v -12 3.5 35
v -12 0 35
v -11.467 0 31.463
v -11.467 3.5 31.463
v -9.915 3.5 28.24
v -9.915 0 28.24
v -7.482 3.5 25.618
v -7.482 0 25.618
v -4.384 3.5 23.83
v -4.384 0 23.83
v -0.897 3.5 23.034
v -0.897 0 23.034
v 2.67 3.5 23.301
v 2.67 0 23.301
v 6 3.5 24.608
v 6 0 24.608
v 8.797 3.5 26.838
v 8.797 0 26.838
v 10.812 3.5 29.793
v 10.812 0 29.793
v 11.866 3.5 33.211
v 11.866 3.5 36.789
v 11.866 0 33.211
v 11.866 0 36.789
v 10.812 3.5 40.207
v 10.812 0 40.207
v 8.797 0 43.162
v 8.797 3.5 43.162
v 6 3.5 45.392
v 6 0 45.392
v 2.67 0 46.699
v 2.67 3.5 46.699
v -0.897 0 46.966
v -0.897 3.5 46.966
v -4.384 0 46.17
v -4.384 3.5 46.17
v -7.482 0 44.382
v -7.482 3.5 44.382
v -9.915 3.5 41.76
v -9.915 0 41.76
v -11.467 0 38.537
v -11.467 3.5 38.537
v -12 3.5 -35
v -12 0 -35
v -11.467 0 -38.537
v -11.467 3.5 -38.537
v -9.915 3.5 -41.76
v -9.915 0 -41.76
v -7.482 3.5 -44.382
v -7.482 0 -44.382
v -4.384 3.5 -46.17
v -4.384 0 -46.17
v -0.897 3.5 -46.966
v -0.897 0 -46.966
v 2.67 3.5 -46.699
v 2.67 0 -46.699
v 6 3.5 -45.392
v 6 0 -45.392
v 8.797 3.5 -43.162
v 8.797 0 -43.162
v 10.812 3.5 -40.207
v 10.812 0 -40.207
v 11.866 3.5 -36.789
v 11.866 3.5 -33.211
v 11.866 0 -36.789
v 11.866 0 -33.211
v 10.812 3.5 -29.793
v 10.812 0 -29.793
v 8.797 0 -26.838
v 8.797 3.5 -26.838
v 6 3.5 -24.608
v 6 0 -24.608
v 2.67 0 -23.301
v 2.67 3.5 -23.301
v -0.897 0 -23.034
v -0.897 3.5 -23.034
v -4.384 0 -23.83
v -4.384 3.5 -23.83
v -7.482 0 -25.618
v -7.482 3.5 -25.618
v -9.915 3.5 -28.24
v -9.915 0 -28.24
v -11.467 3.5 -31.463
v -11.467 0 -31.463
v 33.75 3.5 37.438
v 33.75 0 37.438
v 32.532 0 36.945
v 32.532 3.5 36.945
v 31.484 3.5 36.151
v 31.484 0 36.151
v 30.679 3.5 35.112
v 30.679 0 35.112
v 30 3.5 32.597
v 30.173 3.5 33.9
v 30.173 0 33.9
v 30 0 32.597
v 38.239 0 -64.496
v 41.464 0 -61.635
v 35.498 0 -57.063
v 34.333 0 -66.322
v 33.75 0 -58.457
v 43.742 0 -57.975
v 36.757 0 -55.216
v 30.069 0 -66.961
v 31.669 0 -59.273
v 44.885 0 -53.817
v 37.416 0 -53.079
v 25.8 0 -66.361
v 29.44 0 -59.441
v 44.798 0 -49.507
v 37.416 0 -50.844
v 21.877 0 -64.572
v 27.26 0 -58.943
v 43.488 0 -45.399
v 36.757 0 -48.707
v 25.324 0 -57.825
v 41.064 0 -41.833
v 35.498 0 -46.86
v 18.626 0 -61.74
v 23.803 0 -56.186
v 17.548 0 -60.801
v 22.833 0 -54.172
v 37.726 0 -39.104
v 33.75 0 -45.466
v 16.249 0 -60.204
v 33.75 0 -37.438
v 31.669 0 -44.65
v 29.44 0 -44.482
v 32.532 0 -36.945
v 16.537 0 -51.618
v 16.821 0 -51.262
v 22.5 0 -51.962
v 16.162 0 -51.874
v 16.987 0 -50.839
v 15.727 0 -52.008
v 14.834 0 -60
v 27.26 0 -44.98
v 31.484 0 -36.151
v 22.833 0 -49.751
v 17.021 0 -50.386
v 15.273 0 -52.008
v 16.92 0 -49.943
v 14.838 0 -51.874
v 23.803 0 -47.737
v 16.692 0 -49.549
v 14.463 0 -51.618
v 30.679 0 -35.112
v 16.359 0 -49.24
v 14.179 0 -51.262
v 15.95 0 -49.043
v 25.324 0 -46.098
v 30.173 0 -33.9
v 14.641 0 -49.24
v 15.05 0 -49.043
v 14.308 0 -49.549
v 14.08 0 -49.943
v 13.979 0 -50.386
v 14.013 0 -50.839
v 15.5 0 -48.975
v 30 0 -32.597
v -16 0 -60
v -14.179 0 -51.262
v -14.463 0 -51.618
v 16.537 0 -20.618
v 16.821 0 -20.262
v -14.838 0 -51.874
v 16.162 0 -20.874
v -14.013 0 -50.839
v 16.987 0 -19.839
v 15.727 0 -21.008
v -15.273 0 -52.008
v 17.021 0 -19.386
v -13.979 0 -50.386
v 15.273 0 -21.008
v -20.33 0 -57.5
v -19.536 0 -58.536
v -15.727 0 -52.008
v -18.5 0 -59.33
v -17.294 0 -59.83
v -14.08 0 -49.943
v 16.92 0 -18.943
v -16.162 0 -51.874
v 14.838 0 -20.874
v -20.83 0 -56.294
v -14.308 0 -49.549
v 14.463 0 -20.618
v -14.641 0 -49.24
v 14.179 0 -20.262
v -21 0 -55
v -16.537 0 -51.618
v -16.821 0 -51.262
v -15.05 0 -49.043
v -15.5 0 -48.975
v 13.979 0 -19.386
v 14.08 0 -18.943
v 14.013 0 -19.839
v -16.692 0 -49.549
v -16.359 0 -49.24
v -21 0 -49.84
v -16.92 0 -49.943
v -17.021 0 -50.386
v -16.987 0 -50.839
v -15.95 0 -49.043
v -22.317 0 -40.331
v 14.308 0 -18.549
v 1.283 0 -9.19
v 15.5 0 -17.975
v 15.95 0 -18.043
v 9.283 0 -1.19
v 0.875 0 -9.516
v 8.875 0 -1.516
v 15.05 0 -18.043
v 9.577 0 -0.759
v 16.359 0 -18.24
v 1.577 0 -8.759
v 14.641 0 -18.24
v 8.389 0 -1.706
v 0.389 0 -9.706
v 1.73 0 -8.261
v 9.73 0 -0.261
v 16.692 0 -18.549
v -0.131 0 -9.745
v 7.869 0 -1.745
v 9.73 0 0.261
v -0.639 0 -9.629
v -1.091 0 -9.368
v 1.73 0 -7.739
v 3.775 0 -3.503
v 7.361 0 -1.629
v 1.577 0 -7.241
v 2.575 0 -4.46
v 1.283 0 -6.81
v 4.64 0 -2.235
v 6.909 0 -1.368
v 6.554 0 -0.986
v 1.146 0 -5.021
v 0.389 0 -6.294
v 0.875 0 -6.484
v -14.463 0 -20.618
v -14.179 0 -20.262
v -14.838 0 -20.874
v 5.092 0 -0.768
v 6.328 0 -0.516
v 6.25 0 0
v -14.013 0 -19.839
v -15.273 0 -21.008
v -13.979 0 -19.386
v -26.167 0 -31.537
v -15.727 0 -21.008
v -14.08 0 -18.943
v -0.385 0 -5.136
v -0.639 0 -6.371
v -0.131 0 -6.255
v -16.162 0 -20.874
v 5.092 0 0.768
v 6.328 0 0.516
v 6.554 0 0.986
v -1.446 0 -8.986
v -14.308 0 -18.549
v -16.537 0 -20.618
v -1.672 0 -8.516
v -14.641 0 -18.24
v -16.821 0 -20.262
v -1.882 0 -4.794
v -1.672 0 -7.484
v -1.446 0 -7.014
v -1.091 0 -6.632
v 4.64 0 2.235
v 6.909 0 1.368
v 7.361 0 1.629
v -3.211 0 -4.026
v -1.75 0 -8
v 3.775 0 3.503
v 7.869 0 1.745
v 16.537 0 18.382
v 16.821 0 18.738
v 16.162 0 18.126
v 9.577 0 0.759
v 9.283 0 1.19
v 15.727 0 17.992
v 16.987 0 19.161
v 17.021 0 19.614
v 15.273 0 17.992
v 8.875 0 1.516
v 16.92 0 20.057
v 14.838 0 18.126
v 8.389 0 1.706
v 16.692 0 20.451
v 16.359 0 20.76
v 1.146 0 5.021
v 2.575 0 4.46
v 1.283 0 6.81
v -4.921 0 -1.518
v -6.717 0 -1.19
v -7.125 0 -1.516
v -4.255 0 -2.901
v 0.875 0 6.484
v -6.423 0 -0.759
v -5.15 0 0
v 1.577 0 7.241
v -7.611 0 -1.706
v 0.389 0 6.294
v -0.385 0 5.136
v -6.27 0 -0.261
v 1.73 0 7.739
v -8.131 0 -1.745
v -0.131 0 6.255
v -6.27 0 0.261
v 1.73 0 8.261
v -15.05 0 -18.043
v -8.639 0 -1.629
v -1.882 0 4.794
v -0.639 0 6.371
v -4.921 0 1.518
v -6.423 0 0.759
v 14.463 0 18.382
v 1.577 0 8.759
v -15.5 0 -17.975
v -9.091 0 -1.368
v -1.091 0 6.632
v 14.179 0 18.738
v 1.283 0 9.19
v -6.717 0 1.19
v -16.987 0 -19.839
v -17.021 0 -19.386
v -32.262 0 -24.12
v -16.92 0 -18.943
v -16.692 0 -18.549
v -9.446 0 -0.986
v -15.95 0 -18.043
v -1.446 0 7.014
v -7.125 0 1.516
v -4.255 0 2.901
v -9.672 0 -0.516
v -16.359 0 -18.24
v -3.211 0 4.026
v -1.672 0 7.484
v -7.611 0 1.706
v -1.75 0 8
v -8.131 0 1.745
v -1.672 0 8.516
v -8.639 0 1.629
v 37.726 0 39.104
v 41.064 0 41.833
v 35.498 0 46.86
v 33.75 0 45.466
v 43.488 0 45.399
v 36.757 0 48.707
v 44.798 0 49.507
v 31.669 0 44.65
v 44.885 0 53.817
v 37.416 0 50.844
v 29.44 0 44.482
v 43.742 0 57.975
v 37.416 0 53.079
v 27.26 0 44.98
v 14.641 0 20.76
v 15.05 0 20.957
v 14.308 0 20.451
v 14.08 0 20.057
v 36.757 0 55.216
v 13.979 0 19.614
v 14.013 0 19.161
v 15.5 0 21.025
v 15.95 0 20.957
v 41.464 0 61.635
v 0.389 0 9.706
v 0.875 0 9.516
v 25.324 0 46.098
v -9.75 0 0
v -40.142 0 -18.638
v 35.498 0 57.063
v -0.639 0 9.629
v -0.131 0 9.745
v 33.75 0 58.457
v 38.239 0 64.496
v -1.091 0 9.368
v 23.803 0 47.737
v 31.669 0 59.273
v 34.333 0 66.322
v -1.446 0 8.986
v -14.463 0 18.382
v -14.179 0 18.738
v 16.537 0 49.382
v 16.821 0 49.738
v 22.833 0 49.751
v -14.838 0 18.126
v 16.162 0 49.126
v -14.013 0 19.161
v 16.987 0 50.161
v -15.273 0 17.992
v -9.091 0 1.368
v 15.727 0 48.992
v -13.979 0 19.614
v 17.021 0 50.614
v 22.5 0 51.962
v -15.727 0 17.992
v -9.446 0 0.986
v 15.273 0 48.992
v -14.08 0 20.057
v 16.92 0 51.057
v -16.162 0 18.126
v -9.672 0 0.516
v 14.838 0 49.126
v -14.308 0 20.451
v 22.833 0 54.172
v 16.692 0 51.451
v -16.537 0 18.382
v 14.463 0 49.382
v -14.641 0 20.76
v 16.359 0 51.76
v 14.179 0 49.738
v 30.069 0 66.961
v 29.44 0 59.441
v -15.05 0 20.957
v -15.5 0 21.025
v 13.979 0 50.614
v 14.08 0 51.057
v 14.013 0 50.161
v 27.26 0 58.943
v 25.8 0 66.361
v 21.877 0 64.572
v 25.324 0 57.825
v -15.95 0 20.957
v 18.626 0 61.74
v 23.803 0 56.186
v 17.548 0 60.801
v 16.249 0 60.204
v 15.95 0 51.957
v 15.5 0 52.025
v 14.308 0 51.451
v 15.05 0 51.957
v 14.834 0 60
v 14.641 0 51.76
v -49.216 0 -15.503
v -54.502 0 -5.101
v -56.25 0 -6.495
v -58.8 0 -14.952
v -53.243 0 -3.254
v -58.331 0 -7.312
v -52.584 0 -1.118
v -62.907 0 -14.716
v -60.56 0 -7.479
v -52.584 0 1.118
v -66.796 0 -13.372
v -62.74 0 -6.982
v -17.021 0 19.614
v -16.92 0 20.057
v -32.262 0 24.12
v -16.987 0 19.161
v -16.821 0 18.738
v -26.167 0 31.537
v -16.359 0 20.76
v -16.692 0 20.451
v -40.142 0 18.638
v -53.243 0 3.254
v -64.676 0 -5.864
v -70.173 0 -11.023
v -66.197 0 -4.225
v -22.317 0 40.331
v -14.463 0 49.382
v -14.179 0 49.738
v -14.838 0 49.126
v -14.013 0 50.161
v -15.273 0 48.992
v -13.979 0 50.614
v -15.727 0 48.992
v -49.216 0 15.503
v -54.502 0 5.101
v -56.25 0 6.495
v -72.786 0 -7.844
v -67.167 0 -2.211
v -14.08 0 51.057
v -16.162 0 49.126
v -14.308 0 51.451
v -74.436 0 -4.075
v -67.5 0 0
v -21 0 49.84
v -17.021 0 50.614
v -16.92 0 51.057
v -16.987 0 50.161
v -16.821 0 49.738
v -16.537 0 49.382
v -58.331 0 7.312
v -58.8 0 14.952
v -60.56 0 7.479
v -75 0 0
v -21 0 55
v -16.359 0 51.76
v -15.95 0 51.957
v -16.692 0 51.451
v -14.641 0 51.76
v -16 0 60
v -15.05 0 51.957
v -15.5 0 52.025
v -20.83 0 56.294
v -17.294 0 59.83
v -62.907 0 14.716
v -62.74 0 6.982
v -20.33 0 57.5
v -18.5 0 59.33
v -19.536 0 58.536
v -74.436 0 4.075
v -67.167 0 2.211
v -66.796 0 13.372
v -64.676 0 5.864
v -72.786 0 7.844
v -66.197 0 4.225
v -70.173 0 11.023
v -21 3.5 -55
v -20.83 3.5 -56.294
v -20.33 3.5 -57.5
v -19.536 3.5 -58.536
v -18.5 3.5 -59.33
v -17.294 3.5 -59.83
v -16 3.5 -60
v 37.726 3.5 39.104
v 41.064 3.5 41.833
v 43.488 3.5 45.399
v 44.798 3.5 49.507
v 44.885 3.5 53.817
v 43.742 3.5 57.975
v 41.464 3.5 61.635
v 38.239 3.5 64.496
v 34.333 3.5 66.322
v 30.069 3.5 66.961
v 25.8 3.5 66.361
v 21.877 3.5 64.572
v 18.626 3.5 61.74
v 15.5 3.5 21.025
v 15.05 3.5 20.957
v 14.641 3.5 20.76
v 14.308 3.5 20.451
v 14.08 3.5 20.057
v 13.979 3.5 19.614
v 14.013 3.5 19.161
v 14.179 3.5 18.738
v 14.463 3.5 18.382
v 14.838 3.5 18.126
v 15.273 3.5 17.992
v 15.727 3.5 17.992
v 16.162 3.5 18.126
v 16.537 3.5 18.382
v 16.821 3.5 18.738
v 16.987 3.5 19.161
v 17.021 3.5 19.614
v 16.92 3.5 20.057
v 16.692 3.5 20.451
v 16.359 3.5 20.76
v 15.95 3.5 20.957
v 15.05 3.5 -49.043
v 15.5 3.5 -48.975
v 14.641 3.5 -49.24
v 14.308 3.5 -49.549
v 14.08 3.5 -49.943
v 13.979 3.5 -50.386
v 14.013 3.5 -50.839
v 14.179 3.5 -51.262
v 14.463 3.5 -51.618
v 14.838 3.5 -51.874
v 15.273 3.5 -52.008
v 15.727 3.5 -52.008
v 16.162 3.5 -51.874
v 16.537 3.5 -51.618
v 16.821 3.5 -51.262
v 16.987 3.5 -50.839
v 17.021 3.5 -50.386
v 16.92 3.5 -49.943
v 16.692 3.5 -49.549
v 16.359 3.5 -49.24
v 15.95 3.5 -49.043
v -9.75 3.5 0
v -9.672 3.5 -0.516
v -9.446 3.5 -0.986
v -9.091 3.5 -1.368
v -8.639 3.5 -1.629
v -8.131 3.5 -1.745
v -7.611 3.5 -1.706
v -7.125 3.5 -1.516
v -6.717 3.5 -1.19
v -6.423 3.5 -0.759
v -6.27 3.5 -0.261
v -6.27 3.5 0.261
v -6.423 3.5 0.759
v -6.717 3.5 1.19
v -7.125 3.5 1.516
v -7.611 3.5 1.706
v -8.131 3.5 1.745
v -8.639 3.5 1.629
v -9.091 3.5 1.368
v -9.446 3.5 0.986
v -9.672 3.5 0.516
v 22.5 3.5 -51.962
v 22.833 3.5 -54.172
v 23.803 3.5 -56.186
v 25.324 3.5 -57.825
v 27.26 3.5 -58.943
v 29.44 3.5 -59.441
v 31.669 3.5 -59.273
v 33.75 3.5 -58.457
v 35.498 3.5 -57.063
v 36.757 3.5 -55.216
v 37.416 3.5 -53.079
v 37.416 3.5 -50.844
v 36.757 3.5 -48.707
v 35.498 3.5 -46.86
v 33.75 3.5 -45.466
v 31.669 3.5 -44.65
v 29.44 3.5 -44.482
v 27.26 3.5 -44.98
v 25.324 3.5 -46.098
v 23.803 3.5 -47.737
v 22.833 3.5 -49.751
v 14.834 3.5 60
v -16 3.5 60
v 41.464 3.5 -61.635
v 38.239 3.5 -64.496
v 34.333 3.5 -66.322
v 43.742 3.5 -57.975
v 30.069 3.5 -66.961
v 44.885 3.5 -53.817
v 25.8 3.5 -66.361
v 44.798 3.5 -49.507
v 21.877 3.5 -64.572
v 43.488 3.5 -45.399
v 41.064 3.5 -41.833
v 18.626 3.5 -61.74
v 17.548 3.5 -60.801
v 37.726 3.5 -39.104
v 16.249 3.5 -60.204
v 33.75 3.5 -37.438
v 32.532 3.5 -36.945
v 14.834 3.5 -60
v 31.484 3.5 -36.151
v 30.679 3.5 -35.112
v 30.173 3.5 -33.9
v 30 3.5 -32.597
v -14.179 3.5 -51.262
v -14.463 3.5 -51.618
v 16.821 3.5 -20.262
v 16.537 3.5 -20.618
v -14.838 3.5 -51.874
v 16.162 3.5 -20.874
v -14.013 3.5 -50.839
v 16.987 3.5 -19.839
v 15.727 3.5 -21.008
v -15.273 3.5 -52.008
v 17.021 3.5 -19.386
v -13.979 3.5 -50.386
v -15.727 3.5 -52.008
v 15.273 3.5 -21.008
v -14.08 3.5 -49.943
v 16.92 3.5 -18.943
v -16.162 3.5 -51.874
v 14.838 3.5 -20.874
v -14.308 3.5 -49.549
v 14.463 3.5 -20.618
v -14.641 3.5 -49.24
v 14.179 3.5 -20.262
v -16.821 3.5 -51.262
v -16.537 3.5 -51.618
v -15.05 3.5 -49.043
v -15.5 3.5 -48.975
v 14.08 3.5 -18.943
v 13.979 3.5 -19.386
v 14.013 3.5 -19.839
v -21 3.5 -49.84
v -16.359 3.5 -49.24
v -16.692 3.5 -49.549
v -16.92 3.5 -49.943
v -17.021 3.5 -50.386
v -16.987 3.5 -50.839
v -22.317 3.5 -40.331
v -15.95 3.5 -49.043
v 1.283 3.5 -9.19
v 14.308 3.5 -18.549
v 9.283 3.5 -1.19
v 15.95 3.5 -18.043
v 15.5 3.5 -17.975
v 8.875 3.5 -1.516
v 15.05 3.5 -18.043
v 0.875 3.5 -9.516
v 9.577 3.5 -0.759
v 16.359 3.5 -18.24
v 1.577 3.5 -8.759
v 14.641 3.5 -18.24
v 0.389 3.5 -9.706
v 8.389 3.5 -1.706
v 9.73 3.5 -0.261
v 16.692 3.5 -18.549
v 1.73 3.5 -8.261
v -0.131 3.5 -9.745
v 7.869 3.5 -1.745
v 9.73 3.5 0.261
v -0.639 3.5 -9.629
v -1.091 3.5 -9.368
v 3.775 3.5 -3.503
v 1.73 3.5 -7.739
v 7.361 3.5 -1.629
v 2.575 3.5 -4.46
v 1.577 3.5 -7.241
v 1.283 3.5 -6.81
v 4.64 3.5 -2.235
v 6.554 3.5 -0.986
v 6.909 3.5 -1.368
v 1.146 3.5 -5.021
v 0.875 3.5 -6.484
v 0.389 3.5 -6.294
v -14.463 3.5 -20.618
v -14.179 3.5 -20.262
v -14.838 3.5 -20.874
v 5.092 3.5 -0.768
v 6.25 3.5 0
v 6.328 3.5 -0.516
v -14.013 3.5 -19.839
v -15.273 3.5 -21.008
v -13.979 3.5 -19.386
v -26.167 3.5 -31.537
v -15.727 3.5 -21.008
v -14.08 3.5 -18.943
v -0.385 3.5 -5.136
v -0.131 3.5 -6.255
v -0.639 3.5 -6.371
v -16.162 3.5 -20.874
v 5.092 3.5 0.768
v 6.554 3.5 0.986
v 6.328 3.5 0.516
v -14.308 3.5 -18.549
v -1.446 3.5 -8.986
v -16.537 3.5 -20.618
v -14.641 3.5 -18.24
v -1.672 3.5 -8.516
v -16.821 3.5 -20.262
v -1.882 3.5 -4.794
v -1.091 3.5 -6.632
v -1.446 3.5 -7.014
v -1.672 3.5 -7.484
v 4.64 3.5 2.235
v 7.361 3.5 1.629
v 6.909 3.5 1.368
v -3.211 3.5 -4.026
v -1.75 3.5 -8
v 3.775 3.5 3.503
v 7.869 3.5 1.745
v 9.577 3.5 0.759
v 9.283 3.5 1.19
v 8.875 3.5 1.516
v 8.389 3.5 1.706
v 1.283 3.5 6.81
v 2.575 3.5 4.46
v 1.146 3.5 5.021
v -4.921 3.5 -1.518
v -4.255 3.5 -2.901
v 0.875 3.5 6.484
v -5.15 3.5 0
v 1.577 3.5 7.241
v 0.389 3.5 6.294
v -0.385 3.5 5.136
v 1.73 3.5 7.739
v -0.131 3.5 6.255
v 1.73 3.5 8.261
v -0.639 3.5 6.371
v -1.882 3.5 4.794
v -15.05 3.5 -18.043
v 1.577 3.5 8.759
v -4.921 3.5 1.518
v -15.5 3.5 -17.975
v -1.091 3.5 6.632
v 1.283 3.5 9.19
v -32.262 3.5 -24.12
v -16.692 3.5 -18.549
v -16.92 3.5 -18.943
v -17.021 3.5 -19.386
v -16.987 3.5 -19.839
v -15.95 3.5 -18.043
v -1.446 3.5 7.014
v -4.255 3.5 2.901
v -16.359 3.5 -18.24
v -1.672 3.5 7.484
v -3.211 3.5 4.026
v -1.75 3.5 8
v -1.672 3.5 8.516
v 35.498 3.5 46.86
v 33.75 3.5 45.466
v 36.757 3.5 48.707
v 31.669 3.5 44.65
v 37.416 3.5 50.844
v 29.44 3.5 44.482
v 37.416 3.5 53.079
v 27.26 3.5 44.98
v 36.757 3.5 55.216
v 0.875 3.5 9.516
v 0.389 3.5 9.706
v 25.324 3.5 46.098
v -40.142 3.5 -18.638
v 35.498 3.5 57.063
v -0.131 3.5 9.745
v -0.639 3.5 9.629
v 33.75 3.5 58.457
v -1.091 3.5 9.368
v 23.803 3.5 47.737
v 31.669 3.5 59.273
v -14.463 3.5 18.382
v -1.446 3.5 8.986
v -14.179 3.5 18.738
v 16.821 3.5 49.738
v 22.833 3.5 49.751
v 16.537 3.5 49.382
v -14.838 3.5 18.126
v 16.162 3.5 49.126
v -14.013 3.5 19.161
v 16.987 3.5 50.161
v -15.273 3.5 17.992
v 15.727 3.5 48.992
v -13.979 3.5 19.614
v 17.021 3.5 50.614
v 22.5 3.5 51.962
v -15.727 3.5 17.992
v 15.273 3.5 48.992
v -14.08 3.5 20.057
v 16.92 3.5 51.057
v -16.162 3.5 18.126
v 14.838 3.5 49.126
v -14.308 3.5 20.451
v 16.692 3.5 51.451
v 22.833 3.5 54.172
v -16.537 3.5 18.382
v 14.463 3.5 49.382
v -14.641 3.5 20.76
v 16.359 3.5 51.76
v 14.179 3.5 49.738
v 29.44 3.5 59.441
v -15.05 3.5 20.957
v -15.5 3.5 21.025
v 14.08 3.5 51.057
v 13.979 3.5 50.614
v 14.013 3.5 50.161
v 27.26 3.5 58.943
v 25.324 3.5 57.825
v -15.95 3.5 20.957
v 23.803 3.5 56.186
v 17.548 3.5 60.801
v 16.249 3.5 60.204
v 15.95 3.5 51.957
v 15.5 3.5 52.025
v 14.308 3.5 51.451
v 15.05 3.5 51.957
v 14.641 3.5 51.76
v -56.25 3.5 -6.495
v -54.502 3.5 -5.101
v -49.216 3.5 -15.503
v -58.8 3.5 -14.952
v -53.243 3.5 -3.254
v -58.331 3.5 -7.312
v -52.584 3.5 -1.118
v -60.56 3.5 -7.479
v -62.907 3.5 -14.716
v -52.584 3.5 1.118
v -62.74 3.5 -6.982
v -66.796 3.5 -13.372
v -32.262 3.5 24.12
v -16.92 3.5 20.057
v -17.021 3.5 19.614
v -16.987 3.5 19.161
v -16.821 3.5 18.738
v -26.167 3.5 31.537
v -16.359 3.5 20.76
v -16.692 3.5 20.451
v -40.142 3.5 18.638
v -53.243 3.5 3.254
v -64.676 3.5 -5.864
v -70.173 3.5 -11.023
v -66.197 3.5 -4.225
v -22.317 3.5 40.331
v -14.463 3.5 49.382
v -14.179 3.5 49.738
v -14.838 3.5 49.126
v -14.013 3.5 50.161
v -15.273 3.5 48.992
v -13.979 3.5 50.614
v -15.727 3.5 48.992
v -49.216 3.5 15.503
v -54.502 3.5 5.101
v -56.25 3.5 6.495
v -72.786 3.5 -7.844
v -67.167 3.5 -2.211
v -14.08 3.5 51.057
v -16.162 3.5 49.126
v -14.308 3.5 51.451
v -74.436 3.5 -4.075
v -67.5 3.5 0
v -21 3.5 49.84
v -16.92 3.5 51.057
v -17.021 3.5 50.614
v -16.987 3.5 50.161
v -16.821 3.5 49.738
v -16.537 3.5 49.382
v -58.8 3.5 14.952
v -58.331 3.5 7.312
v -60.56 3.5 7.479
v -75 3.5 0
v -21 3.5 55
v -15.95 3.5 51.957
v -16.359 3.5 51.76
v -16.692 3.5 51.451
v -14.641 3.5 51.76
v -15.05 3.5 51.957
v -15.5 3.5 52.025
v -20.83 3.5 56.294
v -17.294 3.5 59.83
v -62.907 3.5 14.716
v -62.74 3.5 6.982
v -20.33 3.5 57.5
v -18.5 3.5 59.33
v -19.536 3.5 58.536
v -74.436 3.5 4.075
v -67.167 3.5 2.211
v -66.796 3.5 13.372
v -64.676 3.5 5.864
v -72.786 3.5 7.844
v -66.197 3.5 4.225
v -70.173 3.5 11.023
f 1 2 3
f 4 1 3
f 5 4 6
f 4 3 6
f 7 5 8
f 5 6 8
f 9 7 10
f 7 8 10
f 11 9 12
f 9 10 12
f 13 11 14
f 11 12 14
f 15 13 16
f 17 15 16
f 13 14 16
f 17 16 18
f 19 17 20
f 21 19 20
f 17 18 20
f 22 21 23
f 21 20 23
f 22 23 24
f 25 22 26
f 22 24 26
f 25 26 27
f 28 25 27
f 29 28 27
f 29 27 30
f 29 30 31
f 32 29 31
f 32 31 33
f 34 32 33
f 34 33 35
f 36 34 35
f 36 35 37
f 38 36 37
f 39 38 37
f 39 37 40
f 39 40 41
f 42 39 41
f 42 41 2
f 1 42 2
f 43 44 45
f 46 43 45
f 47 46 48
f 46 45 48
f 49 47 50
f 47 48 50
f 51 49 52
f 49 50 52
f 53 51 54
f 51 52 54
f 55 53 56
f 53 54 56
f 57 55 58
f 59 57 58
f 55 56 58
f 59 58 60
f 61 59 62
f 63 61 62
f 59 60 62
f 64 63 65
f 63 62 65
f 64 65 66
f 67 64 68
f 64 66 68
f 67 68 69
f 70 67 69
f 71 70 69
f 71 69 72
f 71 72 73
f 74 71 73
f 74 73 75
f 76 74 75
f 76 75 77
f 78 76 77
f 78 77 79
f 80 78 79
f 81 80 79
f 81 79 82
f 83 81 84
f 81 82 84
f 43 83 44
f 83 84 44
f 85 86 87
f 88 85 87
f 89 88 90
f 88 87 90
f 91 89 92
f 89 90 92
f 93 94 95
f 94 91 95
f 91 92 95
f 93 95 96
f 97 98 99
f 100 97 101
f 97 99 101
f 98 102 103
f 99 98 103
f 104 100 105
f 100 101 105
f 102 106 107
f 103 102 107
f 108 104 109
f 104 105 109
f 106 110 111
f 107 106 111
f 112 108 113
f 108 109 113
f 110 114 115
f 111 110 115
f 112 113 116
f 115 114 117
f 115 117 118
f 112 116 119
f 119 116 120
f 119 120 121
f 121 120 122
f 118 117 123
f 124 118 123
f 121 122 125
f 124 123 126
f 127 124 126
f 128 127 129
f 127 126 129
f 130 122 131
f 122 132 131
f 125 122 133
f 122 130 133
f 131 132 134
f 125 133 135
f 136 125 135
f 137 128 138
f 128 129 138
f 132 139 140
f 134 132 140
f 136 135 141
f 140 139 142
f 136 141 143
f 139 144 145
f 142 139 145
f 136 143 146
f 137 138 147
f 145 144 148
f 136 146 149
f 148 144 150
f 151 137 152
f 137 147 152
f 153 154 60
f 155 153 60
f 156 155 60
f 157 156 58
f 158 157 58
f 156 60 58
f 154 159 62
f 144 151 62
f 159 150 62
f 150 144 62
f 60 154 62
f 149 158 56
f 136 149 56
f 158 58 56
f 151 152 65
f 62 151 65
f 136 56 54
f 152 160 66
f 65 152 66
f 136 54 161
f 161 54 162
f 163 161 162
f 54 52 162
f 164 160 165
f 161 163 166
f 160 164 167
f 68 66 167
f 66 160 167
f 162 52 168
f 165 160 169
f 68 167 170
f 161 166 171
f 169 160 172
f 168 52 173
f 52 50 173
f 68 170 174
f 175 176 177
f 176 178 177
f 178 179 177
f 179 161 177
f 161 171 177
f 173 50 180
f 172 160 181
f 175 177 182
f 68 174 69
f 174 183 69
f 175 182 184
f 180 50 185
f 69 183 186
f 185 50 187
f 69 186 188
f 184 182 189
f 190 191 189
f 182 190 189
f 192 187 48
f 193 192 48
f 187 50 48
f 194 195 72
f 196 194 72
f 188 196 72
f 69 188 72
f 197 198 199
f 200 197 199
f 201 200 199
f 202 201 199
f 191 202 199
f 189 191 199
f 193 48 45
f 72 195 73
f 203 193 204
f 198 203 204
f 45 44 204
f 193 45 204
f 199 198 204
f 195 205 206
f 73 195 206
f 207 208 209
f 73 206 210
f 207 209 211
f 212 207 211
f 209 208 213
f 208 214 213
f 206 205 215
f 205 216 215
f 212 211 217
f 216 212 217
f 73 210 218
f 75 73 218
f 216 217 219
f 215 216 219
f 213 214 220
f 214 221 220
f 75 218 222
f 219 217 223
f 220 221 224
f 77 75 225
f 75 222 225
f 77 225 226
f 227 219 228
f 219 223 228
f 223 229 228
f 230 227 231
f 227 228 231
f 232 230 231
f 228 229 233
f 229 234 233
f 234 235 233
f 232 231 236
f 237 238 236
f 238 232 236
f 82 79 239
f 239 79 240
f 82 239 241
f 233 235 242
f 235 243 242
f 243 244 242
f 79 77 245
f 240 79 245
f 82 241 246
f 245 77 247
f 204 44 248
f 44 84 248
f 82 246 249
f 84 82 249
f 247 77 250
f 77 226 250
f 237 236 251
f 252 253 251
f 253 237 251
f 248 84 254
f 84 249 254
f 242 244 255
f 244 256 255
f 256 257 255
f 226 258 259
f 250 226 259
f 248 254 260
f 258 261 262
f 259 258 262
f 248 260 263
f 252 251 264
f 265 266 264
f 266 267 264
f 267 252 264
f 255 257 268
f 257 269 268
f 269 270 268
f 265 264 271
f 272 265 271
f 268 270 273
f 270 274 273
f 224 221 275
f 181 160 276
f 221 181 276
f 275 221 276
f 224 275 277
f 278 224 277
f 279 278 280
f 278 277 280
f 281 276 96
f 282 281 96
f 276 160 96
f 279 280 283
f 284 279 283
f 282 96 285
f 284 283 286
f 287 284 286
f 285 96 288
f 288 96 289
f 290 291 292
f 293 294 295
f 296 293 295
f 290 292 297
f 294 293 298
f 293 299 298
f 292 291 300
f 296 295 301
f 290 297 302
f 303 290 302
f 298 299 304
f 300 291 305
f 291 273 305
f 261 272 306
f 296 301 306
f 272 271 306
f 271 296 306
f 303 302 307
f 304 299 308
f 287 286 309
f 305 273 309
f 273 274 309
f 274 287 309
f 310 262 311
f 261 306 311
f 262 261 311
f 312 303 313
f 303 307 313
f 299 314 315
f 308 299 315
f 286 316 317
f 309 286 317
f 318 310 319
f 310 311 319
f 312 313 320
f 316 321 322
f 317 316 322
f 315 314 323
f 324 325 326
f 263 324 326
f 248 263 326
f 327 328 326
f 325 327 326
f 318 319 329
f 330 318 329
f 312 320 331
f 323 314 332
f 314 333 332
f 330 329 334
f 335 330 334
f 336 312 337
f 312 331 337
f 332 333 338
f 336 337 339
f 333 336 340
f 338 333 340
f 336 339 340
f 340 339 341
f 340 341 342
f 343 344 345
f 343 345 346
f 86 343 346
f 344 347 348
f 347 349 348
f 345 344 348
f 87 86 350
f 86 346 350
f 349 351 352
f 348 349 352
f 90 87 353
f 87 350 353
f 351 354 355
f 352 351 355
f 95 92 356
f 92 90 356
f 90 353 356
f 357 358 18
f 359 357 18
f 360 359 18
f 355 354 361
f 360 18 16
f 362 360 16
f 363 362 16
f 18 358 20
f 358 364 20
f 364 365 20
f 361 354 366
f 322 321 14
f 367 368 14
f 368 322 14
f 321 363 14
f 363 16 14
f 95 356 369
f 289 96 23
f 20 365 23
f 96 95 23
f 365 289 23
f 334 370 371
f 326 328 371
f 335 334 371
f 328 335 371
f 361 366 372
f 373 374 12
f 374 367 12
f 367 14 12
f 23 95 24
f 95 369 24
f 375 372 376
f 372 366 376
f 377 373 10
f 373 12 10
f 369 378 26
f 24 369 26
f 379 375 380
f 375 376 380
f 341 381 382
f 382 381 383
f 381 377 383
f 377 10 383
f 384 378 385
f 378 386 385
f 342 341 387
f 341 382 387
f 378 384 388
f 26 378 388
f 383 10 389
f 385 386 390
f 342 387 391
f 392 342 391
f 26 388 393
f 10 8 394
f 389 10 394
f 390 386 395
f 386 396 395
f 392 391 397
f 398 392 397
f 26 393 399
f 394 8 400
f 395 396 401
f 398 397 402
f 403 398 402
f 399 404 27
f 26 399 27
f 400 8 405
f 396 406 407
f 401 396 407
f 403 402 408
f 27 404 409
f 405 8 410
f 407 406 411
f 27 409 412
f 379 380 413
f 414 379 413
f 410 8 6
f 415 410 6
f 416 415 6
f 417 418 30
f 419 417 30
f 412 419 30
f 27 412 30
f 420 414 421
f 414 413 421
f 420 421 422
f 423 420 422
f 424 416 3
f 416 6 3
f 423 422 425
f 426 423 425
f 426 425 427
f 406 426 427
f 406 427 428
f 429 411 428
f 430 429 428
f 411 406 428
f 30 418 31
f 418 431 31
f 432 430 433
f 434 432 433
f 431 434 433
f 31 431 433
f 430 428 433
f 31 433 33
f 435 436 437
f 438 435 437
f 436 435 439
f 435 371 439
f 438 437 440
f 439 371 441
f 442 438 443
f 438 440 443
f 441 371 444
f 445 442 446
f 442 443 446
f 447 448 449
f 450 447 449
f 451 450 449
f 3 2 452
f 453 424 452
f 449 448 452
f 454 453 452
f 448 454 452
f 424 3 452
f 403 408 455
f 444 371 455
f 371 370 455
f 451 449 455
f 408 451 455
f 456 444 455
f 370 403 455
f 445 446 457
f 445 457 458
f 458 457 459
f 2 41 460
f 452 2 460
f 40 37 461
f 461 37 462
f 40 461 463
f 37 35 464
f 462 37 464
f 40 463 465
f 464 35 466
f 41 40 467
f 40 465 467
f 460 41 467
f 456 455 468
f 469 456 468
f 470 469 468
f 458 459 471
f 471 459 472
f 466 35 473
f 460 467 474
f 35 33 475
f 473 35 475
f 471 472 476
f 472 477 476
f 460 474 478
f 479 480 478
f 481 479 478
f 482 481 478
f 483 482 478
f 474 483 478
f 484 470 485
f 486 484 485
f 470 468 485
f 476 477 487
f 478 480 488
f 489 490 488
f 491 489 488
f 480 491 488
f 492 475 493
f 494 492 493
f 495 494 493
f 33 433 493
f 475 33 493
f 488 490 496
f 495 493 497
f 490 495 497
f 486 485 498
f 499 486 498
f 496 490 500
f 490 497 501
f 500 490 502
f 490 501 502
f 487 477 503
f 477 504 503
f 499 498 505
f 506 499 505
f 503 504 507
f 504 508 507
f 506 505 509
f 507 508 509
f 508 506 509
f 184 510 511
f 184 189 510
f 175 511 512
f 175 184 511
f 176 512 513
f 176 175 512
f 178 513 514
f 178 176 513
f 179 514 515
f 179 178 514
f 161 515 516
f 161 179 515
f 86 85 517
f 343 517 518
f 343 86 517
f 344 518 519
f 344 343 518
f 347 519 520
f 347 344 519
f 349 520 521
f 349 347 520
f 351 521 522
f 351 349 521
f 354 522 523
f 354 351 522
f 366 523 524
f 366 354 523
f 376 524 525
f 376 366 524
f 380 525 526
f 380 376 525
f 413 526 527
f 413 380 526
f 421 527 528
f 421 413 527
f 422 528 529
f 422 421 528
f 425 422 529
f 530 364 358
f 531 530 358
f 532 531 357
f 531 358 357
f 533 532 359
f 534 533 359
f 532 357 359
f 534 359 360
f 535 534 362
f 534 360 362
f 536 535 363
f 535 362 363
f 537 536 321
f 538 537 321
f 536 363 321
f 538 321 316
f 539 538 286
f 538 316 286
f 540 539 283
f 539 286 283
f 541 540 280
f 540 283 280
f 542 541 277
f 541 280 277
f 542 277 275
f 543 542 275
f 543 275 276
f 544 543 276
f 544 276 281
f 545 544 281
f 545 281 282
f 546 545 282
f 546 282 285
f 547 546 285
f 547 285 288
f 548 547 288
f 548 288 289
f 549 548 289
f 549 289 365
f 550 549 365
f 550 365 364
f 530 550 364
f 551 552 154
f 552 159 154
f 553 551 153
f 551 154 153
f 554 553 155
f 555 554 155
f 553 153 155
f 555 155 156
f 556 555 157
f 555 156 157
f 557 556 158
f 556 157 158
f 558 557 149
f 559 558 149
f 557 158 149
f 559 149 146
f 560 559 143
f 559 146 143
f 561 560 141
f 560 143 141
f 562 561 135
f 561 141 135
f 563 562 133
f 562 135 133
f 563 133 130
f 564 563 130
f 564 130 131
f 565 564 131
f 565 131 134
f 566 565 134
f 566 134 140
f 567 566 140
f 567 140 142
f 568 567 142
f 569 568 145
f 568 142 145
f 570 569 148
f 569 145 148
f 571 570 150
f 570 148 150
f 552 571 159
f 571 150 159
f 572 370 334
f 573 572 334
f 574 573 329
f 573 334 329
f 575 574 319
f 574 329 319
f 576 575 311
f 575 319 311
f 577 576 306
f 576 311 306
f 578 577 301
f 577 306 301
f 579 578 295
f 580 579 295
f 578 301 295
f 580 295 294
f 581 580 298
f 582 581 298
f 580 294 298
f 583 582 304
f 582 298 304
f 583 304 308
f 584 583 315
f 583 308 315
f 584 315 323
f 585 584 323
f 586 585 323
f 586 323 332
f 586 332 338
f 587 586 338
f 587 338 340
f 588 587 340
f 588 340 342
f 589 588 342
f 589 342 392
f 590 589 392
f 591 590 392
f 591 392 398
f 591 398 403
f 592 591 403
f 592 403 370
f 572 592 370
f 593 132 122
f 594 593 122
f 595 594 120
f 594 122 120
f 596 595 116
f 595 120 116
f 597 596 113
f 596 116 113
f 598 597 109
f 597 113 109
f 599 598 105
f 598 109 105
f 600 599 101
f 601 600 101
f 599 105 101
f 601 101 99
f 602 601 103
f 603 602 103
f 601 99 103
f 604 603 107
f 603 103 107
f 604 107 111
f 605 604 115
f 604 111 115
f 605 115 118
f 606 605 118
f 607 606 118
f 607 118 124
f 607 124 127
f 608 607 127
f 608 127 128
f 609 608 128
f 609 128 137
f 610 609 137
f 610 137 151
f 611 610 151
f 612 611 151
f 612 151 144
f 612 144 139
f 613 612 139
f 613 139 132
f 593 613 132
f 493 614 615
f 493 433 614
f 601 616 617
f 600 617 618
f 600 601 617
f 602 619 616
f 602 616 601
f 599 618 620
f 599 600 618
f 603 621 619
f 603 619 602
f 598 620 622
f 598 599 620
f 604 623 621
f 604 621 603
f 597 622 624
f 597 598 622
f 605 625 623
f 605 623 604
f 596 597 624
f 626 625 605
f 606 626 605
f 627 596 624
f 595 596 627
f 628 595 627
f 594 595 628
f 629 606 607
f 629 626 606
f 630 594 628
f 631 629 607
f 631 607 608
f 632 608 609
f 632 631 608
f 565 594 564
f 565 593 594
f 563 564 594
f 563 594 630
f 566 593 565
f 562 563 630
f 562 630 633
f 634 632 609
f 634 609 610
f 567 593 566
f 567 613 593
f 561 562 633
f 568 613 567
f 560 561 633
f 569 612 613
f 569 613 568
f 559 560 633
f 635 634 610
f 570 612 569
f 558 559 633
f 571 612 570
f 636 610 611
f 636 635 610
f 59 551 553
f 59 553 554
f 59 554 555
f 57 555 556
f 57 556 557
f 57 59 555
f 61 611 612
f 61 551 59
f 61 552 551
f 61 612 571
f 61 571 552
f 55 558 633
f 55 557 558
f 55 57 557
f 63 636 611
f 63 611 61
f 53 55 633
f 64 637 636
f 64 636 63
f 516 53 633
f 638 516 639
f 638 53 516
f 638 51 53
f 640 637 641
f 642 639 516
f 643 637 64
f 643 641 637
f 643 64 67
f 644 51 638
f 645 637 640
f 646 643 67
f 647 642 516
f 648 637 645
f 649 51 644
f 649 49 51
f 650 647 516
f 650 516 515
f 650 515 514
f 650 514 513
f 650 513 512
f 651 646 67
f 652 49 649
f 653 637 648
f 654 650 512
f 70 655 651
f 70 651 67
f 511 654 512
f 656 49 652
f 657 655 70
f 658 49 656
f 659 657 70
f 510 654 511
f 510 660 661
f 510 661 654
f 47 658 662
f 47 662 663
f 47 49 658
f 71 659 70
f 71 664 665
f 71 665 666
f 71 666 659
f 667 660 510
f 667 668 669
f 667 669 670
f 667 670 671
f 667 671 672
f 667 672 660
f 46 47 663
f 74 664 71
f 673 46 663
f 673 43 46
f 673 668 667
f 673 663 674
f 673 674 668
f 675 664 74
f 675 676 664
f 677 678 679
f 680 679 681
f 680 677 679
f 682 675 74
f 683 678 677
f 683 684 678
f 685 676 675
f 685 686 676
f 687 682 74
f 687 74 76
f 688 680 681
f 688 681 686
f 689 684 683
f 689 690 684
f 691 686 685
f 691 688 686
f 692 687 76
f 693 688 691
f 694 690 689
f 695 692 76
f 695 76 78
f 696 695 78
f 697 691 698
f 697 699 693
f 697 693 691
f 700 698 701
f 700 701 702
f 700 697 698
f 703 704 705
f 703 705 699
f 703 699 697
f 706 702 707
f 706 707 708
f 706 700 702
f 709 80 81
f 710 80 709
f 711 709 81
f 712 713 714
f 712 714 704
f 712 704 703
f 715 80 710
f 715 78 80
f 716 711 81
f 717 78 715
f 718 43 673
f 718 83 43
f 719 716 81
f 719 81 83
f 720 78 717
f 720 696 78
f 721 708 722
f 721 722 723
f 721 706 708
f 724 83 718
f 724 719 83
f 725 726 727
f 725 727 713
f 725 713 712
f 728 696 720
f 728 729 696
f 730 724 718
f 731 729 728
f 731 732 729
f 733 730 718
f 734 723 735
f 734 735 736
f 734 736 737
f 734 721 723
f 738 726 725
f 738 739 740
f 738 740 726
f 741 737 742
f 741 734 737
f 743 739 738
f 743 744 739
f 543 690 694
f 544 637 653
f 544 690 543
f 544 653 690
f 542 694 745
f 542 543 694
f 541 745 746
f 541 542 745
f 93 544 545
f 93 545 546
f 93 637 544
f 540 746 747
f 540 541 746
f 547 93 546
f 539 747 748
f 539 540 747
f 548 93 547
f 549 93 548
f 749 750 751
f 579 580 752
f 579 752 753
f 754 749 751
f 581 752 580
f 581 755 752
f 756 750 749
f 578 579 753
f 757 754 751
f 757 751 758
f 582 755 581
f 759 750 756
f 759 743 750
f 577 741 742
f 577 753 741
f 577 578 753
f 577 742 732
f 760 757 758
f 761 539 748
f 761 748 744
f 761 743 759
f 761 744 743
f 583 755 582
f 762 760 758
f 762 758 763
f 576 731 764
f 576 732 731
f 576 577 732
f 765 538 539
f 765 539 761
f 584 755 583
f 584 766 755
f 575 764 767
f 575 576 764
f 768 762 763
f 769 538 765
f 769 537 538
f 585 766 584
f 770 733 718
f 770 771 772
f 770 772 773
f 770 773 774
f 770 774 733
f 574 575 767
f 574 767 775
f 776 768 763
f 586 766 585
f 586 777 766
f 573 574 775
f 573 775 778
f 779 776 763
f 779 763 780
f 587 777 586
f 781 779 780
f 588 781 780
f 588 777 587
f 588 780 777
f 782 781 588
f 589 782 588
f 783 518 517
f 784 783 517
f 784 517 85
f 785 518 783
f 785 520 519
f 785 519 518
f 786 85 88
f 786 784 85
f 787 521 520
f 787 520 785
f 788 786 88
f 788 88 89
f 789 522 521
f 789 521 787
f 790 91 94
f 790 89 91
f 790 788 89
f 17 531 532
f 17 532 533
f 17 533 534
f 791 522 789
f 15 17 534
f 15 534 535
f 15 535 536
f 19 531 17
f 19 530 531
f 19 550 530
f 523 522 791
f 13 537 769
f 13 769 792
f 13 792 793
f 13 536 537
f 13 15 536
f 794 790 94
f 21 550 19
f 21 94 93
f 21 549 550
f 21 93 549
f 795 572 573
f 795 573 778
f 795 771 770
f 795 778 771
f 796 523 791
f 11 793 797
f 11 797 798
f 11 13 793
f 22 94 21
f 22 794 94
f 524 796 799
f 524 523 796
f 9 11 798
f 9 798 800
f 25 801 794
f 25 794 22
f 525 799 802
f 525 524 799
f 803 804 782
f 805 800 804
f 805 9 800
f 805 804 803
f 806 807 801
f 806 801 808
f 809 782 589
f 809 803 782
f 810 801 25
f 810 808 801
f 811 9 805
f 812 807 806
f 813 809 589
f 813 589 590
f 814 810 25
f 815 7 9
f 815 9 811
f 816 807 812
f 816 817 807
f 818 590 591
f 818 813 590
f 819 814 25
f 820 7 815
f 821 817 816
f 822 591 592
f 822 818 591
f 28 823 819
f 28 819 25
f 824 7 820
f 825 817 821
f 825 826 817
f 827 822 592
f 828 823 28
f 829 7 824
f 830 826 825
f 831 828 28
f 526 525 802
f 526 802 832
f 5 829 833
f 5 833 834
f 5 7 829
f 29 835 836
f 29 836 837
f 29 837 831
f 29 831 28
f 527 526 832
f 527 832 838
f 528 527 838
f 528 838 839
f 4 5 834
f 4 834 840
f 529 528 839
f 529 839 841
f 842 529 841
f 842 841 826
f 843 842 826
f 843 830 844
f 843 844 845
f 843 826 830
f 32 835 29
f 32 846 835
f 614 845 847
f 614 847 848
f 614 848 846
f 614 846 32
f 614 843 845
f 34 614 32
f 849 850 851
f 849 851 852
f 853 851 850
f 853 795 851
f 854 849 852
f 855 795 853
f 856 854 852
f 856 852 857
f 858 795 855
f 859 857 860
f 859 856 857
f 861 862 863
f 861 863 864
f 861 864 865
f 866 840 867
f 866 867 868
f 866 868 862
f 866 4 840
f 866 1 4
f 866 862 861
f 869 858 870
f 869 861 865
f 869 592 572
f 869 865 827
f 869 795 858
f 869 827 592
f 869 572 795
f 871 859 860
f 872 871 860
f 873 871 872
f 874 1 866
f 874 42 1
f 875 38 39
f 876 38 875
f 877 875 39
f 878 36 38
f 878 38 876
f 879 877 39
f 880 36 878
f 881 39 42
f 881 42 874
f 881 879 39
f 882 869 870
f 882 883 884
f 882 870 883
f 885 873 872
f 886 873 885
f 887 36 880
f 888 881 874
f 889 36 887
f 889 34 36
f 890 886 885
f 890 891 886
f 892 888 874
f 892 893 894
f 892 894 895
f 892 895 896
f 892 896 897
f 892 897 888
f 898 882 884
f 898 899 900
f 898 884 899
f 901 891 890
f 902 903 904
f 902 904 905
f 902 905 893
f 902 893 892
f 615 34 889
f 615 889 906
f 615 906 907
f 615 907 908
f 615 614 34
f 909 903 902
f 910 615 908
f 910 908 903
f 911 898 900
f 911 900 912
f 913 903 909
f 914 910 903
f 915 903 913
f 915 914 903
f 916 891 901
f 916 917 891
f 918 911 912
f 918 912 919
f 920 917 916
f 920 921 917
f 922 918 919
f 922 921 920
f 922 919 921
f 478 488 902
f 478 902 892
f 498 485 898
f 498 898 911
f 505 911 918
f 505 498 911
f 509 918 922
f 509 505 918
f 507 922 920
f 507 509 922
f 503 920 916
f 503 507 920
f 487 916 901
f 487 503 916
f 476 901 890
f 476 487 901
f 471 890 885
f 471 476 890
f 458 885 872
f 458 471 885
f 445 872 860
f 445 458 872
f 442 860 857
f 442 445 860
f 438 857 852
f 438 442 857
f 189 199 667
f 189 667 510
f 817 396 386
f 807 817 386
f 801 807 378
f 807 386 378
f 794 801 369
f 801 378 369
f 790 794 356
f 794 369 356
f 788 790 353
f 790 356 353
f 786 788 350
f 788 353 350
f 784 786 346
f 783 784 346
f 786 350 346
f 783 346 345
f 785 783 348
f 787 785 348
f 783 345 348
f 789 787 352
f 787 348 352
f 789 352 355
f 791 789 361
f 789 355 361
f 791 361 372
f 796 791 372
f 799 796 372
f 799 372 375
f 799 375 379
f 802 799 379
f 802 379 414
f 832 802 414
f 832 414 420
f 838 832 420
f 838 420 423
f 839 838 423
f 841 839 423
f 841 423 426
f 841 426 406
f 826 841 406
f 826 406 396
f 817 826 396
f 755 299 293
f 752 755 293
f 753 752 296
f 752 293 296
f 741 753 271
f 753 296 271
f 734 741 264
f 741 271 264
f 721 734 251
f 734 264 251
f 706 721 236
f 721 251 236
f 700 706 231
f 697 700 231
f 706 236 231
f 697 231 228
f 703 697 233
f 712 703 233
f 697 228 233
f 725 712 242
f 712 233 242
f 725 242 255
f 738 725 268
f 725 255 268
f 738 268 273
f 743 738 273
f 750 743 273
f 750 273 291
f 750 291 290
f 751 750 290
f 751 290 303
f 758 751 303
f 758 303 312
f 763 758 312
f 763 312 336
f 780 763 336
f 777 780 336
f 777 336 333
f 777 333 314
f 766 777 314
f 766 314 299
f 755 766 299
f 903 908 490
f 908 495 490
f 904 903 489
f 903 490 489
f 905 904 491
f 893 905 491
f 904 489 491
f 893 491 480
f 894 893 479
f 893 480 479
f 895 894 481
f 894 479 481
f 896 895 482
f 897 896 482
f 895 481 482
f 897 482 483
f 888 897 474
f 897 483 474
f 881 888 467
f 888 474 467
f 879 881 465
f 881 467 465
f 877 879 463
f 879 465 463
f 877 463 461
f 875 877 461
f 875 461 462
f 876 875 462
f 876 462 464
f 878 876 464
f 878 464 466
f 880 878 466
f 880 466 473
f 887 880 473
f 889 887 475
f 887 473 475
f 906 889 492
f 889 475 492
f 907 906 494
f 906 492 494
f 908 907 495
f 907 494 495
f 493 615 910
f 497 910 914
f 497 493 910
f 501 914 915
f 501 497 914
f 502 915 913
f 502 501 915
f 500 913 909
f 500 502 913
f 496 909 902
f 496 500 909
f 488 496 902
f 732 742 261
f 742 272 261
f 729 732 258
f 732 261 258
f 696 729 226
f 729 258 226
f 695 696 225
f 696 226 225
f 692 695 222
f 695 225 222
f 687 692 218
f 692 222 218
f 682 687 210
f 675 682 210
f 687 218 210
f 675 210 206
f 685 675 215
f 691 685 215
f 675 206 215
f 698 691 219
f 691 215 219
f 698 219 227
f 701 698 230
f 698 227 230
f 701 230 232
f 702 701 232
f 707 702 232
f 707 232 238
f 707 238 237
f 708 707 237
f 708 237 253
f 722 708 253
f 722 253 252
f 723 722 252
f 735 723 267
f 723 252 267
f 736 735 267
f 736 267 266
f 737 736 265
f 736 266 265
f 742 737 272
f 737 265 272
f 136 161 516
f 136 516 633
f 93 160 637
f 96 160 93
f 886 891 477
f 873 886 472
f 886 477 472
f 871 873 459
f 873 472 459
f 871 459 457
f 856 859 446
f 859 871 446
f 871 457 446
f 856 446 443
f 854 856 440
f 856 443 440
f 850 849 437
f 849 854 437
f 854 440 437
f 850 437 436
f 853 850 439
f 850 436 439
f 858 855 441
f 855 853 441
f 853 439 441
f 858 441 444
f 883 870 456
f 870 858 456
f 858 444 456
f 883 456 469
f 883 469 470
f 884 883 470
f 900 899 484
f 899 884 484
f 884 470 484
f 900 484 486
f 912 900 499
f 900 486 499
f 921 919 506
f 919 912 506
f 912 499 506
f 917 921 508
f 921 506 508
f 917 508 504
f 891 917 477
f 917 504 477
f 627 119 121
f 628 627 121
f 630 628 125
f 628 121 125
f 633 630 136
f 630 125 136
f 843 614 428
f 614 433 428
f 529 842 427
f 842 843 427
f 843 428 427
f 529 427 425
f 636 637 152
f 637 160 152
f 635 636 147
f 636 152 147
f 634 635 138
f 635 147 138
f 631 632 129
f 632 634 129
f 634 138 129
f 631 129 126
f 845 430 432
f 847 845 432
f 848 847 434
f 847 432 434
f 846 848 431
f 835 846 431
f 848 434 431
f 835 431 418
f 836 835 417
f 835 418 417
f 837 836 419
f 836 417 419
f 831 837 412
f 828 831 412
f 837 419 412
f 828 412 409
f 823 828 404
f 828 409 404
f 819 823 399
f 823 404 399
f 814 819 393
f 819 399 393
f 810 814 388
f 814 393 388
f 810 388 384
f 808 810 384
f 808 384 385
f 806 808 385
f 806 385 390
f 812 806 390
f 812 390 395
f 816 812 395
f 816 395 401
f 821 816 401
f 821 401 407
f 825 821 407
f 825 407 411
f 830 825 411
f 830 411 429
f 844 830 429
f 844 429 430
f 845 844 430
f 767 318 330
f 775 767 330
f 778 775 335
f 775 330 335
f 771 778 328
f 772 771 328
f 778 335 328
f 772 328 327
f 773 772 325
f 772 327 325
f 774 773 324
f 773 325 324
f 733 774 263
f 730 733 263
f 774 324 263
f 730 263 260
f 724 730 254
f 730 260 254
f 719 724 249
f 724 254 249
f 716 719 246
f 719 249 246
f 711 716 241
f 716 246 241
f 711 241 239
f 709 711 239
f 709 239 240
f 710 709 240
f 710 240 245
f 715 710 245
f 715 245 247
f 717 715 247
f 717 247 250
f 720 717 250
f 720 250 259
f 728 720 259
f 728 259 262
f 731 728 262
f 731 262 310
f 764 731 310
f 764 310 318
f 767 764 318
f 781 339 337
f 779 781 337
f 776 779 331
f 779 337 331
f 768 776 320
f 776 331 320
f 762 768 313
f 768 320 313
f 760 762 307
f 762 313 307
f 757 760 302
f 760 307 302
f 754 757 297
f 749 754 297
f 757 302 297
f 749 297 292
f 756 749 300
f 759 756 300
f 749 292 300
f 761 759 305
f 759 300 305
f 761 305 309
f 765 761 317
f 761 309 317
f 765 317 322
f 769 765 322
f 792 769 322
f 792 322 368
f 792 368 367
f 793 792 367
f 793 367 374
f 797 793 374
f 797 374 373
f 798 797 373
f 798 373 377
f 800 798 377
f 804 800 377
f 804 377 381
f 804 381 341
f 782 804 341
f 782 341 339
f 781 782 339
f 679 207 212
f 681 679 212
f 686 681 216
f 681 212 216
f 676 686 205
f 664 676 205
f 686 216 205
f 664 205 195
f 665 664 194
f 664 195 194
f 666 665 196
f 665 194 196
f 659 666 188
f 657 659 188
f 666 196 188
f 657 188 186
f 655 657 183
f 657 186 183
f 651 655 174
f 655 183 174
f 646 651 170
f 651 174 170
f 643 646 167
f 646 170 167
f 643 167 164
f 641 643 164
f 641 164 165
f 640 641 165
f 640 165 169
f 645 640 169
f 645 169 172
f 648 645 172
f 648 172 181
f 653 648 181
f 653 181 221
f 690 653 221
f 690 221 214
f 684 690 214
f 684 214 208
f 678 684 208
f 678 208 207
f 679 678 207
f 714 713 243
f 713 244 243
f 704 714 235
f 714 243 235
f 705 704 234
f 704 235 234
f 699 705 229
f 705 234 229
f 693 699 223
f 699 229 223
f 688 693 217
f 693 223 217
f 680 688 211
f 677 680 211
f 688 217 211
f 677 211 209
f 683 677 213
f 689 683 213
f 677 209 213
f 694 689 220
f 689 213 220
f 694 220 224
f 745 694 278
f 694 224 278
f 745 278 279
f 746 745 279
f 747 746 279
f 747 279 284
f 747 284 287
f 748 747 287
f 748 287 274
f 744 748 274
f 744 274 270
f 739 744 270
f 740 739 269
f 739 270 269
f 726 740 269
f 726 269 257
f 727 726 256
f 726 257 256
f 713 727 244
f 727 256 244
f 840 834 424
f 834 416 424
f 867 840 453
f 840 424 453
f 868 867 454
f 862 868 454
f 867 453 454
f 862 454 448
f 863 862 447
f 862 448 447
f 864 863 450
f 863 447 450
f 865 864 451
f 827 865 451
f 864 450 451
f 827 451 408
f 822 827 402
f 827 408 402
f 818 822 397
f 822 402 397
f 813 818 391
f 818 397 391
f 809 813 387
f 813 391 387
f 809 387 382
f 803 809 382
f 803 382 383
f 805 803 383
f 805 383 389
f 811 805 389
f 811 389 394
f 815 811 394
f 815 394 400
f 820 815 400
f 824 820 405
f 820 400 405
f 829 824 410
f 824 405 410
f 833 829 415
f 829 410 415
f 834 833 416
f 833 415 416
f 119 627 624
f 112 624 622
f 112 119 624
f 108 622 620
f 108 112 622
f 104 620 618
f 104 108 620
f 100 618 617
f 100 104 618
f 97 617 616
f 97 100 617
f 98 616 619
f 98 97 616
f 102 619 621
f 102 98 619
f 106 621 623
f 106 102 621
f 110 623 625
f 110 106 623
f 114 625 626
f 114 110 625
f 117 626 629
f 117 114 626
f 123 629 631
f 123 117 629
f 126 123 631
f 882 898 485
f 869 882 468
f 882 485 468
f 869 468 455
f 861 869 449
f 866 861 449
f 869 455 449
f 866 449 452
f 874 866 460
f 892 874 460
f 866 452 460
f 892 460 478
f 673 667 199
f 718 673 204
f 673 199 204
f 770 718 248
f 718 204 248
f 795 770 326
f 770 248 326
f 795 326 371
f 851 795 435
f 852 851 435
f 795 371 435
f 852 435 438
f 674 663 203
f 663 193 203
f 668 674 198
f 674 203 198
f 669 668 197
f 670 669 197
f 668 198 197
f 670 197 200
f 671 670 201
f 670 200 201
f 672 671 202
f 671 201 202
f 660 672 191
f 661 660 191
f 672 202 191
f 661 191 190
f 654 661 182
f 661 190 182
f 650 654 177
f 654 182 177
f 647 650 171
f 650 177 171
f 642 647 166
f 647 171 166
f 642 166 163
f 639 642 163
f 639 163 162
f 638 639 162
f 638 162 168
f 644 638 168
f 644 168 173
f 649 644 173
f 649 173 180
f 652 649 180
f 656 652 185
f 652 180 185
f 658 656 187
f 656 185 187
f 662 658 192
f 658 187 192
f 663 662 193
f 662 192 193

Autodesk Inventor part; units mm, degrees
ref_plane "YZ Plane" through (0, 0, 0) normal (1, 0, 0) x (0, 1, 0)
ref_plane "XZ Plane" through (0, 0, 0) normal (0, 1, 0) x (-1, 0, 0)
ref_plane "XY Plane" through (0, 0, 0) normal (0, 0, 1) x (1, 0, 0)
sketch "Sketch1" plane through (0, 0, 0) normal (0, 1, 0) x (-1, 0, 0)
  circle A0 centre (0, 0) radius 60
  circle A1 centre (60, 0) radius 7.5
  circle A2 centre (-30, 51.9615) radius 7.5
  circle A3 centre (-30, -51.9615) radius 7.5
  circle A4 centre (0, -35) radius 12
  line L0 (0, -118.7756) -> (0, 118.7756) projected
  line L1 (121.2, 0) -> (-90.2, 0) projected
  circle A5 centre (0, 35) radius 12
  line L2 (21, 10) -> (-21, 10)
  line L3 (-21, 10) -> (-21, 60)
  line L4 (-21, 60) -> (21, 60)
  line L5 (21, 60) -> (21, 10)
  line L6 (21, 10) -> (-21, 60) construction
  line L7 (-21, 10) -> (21, 60) construction
  line L8 (21, -60) -> (-21, -60)
  line L9 (-21, -60) -> (-21, -10)
  line L10 (-21, -10) -> (21, -10)
  line L11 (21, -10) -> (21, -60)
  line L12 (21, -60) -> (-21, -10) construction
  line L13 (-21, -60) -> (21, -10) construction
  circle A6 centre (60, 0) radius 15
  circle A7 centre (-30, 51.9615) radius 15
  circle A8 centre (-30, -51.9615) radius 15
  circle A9 centre (56, 49.8397) radius 35
  circle A10 centre (56, -49.8397) radius 35
  circle A11 centre (0, 0) radius 5.15
  circle A12 centre (16, 55) radius 5
  circle A13 centre (16, -55) radius 5
  circle A14 centre (-14.8343, -65) radius 5
  circle A15 centre (-14.8343, 65) radius 5
  line L14 (-30, -36.9615) -> (-30, 36.9615)
  circle A16 centre (-35, -32.5966) radius 5
  circle A17 centre (-35, 32.5966) radius 5
  circle A18 centre (0, -8) radius 1.75
  circle A19 centre (8, 0) radius 1.75
  circle A20 centre (0, 8) radius 1.75
  circle A21 centre (-8, 0) radius 1.75
  line L15 (0, -9.75) -> (0, -10)
  point P0 (58.8, 14.9519)
  point P1 (21, 49.8397)
  point P2 (21, 55)
  point P3 (16, 60)
  point P4 (-16.174, 57.7789)
  point P5 (-21, 56.3204)
  point P6 (-21, -56.3204)
  point P7 (16, -60)
  point P8 (21, -55)
  point P9 (21, -49.8397)
  point P10 (58.8, -14.9519)
  point P11 (20.8372, -56.2655)
  point P12 (21, -56.205)
  point P13 (12.5965, -58.6628)
  point P14 (0, -60)
  point P15 (20.8372, 56.2655)
  point P16 (21, 56.205)
  point P17 (12.5965, 58.6628)
  point P18 (-21, -39.9615)
  point P19 (0, -10)
  point P20 (0, -5.15)
  point P21 (-5.15, 0)
  point P22 (-21, -56.205)
  point P23 (-16.174, -57.7789)
  point P24 (0, -60)
  point P25 (0, -47)
  point P26 (0, -23)
  point P27 (0, 5.15)
  point P28 (0, 10)
  point P29 (-21, 39.9615)
  point P30 (0, 60)
  point P31 (0, 23)
  point P32 (0, 47)
  point P33 (0, 60)
  point P34 (5.15, 0)
  point P35 (45, 0)
  point P36 (21.546, -55.9979)
  point P37 (58.1195, -14.904)
  point P38 (58.125, -14.8824)
  point P39 (58.1195, 14.904)
  point P40 (21.546, 55.9979)
  point P41 (58.125, 14.8824)
  point P42 (-60, 0)
  point P43 (-41.951, -42.8966)
  point P44 (-23.2831, -55.2982)
  point P45 (-36.2481, -47.8129)
  point P46 (-36.2481, 47.8129)
  point P47 (-23.2831, 55.2982)
  point P48 (-21, 56.205)
  point P49 (75, 0)
  point P50 (59.5312, 7.4853)
  point P51 (67.5, 0)
  point P52 (59.5312, -7.4853)
  point P53 (52.5, 0)
  point P54 (60, 0)
  point P55 (-41.951, 42.8966)
  point P56 (-17.3358, -60)
  point P57 (-17.3358, 60)
  point P58 (-14.8343, 60)
  point P59 (-18.6257, 61.7404)
  point P60 (-33.75, 37.4378)
  point P61 (-30, 32.5966)
  point P62 (-30, -32.5966)
  point P63 (-33.75, -37.4378)
  point P64 (-18.6257, -61.7404)
  point P65 (-14.8343, -60)
  point P66 (-30, 0)
  dimension "d0" = 120
  dimension "d13" = 30
  dimension "d14" = 30
  dimension "d28" = 3.5
  dimension "d1" = 15
  dimension "d4" = 360
  dimension "d6" = 24
  dimension "d7" = 35
  dimension "d8" = 42
  dimension "d9" = 50
  dimension "d10" = 42
  dimension "d11" = 50
  dimension "d12" = 30
  dimension "d15" = 70
  dimension "d16" = 10.3
  dimension "d19" = 10
  dimension "d20" = 10
  dimension "d23" = 10
  dimension "d24" = 10
  dimension "d25" = 30
  dimension "d26" = 10
  dimension "d27" = 10
  dimension "d29" = 8
  dimension "d32" = 360
extrude "Extrusion1" add sketch "Sketch1" along normal blind 3.5 contours A1 L1 A6 A0 | A0 A6 L1 A1 | A1 L1 A6 A0 | A0 A6 L1 A1 | A6 L1 A19 A11 L0 A20 L2 L5 A9 A0 | A0 A9 A6 | A6 A10 A0 | A0 A10 L11 L10 L0 A18 A11 L1 A19 A6 | L5 L2 L0 A5 A0 A12 | L11 A13 A0 L0 A4 L10 | A12 A0 | A13 A0 | A0 A12 | A0 L4 A12 | L2 L3 A7 A0 L0 A5 | L0 A20 A11 L1 A21 L14 A7 L3 L2 | A13 A0 | L10 L9 A8 L14 L1 A21 A11 L0 A18 | L0 A4 A0 A8 L9 L10 | A13 L8 A0 | A0 A7 L4 | L8 A8 A0 | A7 L3 A0 | A0 L3 L4 A7 | L4 A7 A15 | A7 A0 A2 L3 | A8 A0 L9 | L9 A0 A3 A8 | A8 L8 L9 A0 | A14 A8 L8 | A0 A2 A7 L4 L3 | L14 A17 A7 | L9 L8 A8 A0 A3 | A8 A16 L14
sketch "Sketch2" plane through (0, 3.5, 0) normal (0, 1, 0) x (1, 0, 0)
  circle A0 centre (0, -35) radius 12 projected
  line L0 (-99, 0) -> (69, 0) projected
  point P0 (0, 0)
  point P1 (15.5, -50.5)
  point P2 (-15.5, -50.5)
  point P3 (-15.5, -19.5)
  point P4 (15.5, -19.5)
  point P5 (15.5, 50.5)
  point P6 (-15.5, 50.5)
  point P7 (-15.5, 19.5)
  point P8 (15.5, 19.5)
  dimension "d34" = 15.5
  dimension "d35" = 31
  dimension "d36" = 15.5
  dimension "d37" = 31
hole "Hole1" at (15.5, 3.5, 50.5) at (-15.5, 3.5, 50.5) at (-15.5, 3.5, 19.5) at (15.5, 3.5, 19.5) at (15.5, 3.5, -50.5) at (-15.5, 3.5, -50.5) at (-15.5, 3.5, -19.5) at (15.5, 3.5, -19.5) direction (0, -1, 0) diameter 3.05 end through all
properties part number "De_Tren" material "Aluminum 6061"
